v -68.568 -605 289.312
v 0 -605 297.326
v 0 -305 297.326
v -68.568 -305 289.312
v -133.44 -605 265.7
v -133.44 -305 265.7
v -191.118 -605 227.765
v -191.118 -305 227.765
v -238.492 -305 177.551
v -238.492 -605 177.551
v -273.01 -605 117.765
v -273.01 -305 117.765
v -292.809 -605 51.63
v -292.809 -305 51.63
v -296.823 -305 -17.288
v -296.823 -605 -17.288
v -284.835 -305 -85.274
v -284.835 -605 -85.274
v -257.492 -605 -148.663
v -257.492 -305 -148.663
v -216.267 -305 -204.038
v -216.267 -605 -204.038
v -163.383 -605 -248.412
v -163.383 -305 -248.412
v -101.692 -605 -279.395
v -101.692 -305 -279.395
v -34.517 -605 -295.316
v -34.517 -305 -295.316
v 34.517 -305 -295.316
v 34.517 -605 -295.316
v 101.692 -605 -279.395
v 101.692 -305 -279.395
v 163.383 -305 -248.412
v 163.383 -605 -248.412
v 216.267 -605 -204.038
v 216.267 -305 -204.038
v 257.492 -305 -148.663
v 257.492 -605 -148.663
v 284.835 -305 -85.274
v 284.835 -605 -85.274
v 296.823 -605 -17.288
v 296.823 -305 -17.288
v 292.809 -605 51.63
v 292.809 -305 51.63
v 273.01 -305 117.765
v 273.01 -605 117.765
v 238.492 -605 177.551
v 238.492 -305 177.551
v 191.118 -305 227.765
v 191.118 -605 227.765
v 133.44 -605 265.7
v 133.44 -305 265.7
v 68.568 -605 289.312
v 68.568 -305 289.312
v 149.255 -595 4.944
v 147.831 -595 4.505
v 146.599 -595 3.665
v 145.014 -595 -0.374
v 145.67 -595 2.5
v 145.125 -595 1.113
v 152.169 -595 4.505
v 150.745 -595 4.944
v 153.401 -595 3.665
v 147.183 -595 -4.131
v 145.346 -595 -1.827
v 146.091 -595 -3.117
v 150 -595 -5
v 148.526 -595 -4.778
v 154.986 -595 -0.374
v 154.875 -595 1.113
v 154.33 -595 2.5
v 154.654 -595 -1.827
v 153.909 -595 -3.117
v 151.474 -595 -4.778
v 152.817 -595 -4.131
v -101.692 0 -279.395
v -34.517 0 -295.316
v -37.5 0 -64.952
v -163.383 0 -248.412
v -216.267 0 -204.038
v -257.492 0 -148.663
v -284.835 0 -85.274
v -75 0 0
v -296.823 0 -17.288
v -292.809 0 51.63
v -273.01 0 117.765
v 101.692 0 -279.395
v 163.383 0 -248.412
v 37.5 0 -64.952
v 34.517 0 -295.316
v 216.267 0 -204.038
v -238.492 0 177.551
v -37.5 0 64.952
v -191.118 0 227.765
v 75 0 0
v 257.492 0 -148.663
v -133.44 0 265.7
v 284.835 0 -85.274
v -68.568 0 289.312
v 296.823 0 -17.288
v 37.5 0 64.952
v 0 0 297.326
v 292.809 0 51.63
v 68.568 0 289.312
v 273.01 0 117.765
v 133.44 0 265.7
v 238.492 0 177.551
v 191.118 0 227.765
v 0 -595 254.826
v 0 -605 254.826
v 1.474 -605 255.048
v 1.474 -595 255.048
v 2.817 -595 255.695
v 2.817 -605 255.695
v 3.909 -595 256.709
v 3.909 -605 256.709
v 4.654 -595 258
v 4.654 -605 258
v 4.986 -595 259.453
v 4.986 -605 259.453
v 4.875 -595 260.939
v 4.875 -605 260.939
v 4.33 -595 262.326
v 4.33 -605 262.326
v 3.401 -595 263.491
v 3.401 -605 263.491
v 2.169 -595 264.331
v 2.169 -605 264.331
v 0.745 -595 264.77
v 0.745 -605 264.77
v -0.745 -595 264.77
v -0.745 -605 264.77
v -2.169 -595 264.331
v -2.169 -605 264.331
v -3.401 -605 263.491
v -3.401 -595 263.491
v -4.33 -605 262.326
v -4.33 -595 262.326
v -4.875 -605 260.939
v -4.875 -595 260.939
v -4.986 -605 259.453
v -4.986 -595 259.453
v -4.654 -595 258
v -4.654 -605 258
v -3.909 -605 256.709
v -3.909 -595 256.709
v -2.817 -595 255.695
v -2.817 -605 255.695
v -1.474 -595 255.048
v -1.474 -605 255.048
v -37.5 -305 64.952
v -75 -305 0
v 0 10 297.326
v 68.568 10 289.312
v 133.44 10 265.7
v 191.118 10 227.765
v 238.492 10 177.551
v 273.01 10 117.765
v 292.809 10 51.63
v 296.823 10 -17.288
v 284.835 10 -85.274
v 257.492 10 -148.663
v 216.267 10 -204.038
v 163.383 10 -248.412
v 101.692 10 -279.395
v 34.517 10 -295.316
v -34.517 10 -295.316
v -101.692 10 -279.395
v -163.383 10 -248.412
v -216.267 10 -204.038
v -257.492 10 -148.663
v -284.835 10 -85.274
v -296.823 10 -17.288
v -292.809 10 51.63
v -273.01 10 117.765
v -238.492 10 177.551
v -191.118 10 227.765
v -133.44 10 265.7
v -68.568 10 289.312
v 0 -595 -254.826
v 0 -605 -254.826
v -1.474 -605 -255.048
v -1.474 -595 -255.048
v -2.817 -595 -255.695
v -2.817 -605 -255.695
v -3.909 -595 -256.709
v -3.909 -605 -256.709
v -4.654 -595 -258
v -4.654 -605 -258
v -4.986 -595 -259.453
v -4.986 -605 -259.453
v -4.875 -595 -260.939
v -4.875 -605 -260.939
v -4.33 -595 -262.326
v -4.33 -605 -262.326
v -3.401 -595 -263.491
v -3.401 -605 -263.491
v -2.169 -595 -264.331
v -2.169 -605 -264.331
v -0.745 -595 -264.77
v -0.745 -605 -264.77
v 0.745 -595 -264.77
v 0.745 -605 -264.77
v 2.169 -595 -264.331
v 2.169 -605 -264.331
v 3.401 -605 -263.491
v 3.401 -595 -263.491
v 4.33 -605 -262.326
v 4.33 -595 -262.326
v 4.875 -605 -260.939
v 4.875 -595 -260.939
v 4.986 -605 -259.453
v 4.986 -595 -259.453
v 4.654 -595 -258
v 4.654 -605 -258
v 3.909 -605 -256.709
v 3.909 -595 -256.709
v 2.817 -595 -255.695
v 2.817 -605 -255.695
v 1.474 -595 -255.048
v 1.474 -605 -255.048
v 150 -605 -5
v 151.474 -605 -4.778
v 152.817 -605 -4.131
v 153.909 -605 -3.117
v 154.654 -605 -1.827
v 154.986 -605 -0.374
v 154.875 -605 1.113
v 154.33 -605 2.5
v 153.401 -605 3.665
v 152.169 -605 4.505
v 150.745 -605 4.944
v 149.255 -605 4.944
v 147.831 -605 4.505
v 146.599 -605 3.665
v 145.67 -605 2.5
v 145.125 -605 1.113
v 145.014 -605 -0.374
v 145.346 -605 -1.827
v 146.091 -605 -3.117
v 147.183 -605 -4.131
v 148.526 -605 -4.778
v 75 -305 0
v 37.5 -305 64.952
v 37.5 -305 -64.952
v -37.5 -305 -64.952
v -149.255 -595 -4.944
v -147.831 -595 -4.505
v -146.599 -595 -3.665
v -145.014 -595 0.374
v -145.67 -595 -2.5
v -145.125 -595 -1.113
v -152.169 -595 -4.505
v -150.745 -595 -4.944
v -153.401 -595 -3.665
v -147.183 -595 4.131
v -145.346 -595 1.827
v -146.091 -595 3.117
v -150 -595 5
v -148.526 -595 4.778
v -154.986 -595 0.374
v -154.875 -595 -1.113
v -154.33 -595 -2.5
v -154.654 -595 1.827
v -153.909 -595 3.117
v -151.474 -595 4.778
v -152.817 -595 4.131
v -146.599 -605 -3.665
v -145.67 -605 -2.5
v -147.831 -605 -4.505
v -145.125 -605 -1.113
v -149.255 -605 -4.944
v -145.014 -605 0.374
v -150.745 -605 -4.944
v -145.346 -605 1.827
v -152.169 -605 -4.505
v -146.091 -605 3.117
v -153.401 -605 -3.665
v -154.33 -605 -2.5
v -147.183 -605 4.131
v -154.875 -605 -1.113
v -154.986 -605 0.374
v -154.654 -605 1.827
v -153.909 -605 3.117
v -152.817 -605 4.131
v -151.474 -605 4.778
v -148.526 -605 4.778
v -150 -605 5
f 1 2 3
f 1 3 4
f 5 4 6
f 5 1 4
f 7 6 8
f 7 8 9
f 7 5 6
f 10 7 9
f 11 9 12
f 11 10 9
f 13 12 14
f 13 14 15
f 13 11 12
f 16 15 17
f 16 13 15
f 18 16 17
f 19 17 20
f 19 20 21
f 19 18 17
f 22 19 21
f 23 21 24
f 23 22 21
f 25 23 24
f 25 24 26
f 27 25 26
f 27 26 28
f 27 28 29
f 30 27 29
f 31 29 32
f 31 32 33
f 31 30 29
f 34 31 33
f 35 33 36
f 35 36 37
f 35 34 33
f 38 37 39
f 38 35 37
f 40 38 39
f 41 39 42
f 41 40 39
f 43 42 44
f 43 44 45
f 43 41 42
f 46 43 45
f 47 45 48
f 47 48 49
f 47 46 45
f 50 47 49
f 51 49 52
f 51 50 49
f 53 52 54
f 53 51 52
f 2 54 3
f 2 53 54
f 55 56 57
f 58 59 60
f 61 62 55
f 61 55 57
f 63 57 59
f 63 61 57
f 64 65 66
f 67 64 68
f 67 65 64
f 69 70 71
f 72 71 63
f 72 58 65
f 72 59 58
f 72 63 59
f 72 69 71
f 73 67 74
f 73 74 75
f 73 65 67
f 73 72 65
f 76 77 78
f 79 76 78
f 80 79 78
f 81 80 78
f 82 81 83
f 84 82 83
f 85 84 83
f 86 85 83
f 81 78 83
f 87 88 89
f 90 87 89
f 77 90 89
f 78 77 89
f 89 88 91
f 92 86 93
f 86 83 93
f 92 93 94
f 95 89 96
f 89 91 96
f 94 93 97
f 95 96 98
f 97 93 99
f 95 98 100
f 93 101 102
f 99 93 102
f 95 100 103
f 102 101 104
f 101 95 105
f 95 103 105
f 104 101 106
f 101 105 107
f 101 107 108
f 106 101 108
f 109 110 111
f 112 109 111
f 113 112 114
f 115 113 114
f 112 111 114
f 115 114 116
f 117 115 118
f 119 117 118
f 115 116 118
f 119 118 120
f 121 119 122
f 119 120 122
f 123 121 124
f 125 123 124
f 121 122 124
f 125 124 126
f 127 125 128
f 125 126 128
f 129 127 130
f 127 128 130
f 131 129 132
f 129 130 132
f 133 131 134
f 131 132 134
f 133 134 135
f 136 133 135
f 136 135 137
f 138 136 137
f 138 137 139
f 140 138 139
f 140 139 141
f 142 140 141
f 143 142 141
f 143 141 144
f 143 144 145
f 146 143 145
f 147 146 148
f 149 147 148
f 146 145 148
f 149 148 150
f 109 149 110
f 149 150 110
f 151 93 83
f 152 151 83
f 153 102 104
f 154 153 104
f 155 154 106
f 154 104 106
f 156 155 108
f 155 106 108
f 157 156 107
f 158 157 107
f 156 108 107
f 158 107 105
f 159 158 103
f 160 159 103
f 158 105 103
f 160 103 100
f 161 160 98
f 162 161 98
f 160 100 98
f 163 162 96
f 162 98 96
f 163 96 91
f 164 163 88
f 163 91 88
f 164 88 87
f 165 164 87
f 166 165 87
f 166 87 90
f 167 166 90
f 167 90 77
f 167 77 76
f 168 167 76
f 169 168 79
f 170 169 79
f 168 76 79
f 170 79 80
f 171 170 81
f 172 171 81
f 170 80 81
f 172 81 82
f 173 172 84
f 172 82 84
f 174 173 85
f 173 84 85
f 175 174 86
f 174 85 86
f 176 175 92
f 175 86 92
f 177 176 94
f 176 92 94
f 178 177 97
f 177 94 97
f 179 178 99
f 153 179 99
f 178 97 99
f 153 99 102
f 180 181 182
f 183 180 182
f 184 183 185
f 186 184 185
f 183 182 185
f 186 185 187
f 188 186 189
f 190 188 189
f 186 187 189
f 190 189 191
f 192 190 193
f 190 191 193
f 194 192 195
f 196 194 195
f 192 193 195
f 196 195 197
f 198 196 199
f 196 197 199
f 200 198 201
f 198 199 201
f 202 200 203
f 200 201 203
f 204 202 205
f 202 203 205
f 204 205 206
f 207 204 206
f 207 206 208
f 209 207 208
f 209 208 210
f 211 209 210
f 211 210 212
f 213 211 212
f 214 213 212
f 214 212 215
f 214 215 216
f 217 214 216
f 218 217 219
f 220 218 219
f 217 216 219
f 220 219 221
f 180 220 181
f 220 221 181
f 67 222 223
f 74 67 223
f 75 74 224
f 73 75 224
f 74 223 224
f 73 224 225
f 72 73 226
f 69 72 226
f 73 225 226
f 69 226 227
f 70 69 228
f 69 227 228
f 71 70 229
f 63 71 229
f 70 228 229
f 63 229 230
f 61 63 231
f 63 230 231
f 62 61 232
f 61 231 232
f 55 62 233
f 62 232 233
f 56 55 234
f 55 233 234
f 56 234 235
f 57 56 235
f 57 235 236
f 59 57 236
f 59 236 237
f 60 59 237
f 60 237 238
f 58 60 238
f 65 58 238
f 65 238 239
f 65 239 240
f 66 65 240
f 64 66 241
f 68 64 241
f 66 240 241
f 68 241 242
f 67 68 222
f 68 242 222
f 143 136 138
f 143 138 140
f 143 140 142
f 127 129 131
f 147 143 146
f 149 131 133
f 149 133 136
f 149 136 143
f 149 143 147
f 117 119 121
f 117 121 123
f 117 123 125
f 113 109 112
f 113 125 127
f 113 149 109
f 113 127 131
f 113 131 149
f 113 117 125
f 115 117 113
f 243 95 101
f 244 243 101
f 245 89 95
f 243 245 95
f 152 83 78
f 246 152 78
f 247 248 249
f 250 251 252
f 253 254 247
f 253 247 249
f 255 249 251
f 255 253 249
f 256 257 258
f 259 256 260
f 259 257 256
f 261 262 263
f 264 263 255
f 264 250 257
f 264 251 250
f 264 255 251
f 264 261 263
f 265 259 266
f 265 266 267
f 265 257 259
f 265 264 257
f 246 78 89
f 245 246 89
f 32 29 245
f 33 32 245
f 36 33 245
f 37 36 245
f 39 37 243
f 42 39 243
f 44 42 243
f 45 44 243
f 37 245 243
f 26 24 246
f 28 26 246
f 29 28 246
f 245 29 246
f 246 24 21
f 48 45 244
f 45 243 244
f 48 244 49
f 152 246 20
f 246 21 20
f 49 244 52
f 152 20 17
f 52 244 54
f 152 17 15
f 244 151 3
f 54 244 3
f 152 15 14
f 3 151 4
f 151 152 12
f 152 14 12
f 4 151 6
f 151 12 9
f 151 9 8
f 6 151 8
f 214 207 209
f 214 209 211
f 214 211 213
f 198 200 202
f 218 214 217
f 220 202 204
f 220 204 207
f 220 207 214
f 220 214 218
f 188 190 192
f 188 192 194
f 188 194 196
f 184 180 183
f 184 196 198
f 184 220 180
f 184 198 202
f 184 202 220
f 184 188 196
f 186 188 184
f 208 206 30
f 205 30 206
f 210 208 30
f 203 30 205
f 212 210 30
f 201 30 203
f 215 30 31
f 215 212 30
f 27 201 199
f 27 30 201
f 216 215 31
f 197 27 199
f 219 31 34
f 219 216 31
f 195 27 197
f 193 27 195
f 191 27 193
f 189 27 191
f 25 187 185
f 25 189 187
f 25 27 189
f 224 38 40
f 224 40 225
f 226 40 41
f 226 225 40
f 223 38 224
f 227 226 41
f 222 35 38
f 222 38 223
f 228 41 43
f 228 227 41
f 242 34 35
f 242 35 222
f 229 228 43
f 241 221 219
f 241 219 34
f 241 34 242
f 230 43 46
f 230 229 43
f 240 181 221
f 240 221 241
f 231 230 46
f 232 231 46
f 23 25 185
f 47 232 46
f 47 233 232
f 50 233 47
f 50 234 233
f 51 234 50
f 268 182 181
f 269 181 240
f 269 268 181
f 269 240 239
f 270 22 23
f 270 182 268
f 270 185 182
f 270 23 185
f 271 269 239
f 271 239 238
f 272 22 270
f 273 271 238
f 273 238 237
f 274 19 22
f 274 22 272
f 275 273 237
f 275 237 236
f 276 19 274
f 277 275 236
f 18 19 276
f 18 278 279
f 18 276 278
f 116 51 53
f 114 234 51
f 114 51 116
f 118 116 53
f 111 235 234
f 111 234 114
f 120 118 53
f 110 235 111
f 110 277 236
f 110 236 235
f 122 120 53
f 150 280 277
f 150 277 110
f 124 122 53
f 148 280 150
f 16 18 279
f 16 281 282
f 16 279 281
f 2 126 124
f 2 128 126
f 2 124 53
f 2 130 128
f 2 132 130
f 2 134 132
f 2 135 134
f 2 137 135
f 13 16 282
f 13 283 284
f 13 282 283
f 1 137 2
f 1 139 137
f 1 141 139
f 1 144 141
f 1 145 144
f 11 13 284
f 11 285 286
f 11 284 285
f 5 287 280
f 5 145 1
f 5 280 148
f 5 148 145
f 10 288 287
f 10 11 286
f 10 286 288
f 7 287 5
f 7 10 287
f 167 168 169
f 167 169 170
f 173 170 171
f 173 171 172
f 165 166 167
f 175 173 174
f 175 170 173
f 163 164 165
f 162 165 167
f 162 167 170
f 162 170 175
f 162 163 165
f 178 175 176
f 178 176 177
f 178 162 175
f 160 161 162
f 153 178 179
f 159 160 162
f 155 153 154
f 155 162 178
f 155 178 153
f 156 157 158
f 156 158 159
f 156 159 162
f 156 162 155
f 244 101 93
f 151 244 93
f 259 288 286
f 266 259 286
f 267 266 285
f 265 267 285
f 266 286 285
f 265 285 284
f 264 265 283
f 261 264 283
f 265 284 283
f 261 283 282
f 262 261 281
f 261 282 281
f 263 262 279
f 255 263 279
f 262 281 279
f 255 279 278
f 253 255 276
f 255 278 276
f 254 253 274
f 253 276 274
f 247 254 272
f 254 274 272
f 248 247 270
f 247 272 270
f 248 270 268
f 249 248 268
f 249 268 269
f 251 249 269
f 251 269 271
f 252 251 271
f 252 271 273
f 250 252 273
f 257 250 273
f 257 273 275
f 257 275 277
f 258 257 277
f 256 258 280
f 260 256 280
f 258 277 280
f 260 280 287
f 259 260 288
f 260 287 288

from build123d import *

# Parameters (mm, degrees)
SKETCH1_R           = 297.326212148
BOSS_EXTRUDE1_DEPTH = 10
BOSS_EXTRUDE2_DEPTH = 305
BOSS_EXTRUDE3_START = 300
SKETCH3_R           = 297.326212148
BOSS_EXTRUDE3_DEPTH = 300
SKETCH5_R           = 5
CUT_EXTRUDE1_DEPTH  = 10
SKETCH6_R           = 5
CUT_EXTRUDE2_DEPTH  = 10


with BuildPart() as part:
    # Sketch1 → Boss-Extrude1 (new body)
    with BuildSketch(Plane(origin=(0, 0, 0), x_dir=(1, 0, 0), z_dir=(0, 1, 0))):
        with Locations(Location((0, 0, 0), (0, 0, 270))):
            Circle(SKETCH1_R)
    extrude(amount=BOSS_EXTRUDE1_DEPTH)

    # Sketch2 → Boss-Extrude2 (add)
    with BuildSketch(Plane.XZ):
        Polygon((75, 0), (37.5, 64.951905284), (-37.5, 64.951905284), (-75, 0), (-37.5, -64.951905284), (37.5, -64.951905284), align=None)
    extrude(amount=BOSS_EXTRUDE2_DEPTH)

    # Sketch3 → Boss-Extrude3 (add)
    with BuildSketch(Plane.XZ.offset(305).offset(BOSS_EXTRUDE3_START)):
        with Locations(Location((0, 0, 0), (0, 0, 90))):
            Circle(SKETCH3_R)
    extrude(amount=-BOSS_EXTRUDE3_DEPTH)

    # Sketch5 → Cut-Extrude1 (cut)
    with BuildSketch(Plane.XZ.offset(605)):
        with Locations(Location((150, 0, 0), (0, 0, 270))):
            Circle(SKETCH5_R)
        with Locations(Location((-150, 0, 0), (0, 0, 90))):
            Circle(SKETCH5_R)
    extrude(amount=-CUT_EXTRUDE1_DEPTH, mode=Mode.SUBTRACT)

    # Sketch6 → Cut-Extrude2 (cut)
    with BuildSketch(Plane.XZ.offset(605)):
        with Locations(Location((0, 259.826212148, 0), (0, 0, 270))):
            Circle(SKETCH6_R)
        with Locations(Location((0, -259.826212148, 0), (0, 0, 90))):
            Circle(SKETCH6_R)
    extrude(amount=-CUT_EXTRUDE2_DEPTH, mode=Mode.SUBTRACT)


solid = part.part
